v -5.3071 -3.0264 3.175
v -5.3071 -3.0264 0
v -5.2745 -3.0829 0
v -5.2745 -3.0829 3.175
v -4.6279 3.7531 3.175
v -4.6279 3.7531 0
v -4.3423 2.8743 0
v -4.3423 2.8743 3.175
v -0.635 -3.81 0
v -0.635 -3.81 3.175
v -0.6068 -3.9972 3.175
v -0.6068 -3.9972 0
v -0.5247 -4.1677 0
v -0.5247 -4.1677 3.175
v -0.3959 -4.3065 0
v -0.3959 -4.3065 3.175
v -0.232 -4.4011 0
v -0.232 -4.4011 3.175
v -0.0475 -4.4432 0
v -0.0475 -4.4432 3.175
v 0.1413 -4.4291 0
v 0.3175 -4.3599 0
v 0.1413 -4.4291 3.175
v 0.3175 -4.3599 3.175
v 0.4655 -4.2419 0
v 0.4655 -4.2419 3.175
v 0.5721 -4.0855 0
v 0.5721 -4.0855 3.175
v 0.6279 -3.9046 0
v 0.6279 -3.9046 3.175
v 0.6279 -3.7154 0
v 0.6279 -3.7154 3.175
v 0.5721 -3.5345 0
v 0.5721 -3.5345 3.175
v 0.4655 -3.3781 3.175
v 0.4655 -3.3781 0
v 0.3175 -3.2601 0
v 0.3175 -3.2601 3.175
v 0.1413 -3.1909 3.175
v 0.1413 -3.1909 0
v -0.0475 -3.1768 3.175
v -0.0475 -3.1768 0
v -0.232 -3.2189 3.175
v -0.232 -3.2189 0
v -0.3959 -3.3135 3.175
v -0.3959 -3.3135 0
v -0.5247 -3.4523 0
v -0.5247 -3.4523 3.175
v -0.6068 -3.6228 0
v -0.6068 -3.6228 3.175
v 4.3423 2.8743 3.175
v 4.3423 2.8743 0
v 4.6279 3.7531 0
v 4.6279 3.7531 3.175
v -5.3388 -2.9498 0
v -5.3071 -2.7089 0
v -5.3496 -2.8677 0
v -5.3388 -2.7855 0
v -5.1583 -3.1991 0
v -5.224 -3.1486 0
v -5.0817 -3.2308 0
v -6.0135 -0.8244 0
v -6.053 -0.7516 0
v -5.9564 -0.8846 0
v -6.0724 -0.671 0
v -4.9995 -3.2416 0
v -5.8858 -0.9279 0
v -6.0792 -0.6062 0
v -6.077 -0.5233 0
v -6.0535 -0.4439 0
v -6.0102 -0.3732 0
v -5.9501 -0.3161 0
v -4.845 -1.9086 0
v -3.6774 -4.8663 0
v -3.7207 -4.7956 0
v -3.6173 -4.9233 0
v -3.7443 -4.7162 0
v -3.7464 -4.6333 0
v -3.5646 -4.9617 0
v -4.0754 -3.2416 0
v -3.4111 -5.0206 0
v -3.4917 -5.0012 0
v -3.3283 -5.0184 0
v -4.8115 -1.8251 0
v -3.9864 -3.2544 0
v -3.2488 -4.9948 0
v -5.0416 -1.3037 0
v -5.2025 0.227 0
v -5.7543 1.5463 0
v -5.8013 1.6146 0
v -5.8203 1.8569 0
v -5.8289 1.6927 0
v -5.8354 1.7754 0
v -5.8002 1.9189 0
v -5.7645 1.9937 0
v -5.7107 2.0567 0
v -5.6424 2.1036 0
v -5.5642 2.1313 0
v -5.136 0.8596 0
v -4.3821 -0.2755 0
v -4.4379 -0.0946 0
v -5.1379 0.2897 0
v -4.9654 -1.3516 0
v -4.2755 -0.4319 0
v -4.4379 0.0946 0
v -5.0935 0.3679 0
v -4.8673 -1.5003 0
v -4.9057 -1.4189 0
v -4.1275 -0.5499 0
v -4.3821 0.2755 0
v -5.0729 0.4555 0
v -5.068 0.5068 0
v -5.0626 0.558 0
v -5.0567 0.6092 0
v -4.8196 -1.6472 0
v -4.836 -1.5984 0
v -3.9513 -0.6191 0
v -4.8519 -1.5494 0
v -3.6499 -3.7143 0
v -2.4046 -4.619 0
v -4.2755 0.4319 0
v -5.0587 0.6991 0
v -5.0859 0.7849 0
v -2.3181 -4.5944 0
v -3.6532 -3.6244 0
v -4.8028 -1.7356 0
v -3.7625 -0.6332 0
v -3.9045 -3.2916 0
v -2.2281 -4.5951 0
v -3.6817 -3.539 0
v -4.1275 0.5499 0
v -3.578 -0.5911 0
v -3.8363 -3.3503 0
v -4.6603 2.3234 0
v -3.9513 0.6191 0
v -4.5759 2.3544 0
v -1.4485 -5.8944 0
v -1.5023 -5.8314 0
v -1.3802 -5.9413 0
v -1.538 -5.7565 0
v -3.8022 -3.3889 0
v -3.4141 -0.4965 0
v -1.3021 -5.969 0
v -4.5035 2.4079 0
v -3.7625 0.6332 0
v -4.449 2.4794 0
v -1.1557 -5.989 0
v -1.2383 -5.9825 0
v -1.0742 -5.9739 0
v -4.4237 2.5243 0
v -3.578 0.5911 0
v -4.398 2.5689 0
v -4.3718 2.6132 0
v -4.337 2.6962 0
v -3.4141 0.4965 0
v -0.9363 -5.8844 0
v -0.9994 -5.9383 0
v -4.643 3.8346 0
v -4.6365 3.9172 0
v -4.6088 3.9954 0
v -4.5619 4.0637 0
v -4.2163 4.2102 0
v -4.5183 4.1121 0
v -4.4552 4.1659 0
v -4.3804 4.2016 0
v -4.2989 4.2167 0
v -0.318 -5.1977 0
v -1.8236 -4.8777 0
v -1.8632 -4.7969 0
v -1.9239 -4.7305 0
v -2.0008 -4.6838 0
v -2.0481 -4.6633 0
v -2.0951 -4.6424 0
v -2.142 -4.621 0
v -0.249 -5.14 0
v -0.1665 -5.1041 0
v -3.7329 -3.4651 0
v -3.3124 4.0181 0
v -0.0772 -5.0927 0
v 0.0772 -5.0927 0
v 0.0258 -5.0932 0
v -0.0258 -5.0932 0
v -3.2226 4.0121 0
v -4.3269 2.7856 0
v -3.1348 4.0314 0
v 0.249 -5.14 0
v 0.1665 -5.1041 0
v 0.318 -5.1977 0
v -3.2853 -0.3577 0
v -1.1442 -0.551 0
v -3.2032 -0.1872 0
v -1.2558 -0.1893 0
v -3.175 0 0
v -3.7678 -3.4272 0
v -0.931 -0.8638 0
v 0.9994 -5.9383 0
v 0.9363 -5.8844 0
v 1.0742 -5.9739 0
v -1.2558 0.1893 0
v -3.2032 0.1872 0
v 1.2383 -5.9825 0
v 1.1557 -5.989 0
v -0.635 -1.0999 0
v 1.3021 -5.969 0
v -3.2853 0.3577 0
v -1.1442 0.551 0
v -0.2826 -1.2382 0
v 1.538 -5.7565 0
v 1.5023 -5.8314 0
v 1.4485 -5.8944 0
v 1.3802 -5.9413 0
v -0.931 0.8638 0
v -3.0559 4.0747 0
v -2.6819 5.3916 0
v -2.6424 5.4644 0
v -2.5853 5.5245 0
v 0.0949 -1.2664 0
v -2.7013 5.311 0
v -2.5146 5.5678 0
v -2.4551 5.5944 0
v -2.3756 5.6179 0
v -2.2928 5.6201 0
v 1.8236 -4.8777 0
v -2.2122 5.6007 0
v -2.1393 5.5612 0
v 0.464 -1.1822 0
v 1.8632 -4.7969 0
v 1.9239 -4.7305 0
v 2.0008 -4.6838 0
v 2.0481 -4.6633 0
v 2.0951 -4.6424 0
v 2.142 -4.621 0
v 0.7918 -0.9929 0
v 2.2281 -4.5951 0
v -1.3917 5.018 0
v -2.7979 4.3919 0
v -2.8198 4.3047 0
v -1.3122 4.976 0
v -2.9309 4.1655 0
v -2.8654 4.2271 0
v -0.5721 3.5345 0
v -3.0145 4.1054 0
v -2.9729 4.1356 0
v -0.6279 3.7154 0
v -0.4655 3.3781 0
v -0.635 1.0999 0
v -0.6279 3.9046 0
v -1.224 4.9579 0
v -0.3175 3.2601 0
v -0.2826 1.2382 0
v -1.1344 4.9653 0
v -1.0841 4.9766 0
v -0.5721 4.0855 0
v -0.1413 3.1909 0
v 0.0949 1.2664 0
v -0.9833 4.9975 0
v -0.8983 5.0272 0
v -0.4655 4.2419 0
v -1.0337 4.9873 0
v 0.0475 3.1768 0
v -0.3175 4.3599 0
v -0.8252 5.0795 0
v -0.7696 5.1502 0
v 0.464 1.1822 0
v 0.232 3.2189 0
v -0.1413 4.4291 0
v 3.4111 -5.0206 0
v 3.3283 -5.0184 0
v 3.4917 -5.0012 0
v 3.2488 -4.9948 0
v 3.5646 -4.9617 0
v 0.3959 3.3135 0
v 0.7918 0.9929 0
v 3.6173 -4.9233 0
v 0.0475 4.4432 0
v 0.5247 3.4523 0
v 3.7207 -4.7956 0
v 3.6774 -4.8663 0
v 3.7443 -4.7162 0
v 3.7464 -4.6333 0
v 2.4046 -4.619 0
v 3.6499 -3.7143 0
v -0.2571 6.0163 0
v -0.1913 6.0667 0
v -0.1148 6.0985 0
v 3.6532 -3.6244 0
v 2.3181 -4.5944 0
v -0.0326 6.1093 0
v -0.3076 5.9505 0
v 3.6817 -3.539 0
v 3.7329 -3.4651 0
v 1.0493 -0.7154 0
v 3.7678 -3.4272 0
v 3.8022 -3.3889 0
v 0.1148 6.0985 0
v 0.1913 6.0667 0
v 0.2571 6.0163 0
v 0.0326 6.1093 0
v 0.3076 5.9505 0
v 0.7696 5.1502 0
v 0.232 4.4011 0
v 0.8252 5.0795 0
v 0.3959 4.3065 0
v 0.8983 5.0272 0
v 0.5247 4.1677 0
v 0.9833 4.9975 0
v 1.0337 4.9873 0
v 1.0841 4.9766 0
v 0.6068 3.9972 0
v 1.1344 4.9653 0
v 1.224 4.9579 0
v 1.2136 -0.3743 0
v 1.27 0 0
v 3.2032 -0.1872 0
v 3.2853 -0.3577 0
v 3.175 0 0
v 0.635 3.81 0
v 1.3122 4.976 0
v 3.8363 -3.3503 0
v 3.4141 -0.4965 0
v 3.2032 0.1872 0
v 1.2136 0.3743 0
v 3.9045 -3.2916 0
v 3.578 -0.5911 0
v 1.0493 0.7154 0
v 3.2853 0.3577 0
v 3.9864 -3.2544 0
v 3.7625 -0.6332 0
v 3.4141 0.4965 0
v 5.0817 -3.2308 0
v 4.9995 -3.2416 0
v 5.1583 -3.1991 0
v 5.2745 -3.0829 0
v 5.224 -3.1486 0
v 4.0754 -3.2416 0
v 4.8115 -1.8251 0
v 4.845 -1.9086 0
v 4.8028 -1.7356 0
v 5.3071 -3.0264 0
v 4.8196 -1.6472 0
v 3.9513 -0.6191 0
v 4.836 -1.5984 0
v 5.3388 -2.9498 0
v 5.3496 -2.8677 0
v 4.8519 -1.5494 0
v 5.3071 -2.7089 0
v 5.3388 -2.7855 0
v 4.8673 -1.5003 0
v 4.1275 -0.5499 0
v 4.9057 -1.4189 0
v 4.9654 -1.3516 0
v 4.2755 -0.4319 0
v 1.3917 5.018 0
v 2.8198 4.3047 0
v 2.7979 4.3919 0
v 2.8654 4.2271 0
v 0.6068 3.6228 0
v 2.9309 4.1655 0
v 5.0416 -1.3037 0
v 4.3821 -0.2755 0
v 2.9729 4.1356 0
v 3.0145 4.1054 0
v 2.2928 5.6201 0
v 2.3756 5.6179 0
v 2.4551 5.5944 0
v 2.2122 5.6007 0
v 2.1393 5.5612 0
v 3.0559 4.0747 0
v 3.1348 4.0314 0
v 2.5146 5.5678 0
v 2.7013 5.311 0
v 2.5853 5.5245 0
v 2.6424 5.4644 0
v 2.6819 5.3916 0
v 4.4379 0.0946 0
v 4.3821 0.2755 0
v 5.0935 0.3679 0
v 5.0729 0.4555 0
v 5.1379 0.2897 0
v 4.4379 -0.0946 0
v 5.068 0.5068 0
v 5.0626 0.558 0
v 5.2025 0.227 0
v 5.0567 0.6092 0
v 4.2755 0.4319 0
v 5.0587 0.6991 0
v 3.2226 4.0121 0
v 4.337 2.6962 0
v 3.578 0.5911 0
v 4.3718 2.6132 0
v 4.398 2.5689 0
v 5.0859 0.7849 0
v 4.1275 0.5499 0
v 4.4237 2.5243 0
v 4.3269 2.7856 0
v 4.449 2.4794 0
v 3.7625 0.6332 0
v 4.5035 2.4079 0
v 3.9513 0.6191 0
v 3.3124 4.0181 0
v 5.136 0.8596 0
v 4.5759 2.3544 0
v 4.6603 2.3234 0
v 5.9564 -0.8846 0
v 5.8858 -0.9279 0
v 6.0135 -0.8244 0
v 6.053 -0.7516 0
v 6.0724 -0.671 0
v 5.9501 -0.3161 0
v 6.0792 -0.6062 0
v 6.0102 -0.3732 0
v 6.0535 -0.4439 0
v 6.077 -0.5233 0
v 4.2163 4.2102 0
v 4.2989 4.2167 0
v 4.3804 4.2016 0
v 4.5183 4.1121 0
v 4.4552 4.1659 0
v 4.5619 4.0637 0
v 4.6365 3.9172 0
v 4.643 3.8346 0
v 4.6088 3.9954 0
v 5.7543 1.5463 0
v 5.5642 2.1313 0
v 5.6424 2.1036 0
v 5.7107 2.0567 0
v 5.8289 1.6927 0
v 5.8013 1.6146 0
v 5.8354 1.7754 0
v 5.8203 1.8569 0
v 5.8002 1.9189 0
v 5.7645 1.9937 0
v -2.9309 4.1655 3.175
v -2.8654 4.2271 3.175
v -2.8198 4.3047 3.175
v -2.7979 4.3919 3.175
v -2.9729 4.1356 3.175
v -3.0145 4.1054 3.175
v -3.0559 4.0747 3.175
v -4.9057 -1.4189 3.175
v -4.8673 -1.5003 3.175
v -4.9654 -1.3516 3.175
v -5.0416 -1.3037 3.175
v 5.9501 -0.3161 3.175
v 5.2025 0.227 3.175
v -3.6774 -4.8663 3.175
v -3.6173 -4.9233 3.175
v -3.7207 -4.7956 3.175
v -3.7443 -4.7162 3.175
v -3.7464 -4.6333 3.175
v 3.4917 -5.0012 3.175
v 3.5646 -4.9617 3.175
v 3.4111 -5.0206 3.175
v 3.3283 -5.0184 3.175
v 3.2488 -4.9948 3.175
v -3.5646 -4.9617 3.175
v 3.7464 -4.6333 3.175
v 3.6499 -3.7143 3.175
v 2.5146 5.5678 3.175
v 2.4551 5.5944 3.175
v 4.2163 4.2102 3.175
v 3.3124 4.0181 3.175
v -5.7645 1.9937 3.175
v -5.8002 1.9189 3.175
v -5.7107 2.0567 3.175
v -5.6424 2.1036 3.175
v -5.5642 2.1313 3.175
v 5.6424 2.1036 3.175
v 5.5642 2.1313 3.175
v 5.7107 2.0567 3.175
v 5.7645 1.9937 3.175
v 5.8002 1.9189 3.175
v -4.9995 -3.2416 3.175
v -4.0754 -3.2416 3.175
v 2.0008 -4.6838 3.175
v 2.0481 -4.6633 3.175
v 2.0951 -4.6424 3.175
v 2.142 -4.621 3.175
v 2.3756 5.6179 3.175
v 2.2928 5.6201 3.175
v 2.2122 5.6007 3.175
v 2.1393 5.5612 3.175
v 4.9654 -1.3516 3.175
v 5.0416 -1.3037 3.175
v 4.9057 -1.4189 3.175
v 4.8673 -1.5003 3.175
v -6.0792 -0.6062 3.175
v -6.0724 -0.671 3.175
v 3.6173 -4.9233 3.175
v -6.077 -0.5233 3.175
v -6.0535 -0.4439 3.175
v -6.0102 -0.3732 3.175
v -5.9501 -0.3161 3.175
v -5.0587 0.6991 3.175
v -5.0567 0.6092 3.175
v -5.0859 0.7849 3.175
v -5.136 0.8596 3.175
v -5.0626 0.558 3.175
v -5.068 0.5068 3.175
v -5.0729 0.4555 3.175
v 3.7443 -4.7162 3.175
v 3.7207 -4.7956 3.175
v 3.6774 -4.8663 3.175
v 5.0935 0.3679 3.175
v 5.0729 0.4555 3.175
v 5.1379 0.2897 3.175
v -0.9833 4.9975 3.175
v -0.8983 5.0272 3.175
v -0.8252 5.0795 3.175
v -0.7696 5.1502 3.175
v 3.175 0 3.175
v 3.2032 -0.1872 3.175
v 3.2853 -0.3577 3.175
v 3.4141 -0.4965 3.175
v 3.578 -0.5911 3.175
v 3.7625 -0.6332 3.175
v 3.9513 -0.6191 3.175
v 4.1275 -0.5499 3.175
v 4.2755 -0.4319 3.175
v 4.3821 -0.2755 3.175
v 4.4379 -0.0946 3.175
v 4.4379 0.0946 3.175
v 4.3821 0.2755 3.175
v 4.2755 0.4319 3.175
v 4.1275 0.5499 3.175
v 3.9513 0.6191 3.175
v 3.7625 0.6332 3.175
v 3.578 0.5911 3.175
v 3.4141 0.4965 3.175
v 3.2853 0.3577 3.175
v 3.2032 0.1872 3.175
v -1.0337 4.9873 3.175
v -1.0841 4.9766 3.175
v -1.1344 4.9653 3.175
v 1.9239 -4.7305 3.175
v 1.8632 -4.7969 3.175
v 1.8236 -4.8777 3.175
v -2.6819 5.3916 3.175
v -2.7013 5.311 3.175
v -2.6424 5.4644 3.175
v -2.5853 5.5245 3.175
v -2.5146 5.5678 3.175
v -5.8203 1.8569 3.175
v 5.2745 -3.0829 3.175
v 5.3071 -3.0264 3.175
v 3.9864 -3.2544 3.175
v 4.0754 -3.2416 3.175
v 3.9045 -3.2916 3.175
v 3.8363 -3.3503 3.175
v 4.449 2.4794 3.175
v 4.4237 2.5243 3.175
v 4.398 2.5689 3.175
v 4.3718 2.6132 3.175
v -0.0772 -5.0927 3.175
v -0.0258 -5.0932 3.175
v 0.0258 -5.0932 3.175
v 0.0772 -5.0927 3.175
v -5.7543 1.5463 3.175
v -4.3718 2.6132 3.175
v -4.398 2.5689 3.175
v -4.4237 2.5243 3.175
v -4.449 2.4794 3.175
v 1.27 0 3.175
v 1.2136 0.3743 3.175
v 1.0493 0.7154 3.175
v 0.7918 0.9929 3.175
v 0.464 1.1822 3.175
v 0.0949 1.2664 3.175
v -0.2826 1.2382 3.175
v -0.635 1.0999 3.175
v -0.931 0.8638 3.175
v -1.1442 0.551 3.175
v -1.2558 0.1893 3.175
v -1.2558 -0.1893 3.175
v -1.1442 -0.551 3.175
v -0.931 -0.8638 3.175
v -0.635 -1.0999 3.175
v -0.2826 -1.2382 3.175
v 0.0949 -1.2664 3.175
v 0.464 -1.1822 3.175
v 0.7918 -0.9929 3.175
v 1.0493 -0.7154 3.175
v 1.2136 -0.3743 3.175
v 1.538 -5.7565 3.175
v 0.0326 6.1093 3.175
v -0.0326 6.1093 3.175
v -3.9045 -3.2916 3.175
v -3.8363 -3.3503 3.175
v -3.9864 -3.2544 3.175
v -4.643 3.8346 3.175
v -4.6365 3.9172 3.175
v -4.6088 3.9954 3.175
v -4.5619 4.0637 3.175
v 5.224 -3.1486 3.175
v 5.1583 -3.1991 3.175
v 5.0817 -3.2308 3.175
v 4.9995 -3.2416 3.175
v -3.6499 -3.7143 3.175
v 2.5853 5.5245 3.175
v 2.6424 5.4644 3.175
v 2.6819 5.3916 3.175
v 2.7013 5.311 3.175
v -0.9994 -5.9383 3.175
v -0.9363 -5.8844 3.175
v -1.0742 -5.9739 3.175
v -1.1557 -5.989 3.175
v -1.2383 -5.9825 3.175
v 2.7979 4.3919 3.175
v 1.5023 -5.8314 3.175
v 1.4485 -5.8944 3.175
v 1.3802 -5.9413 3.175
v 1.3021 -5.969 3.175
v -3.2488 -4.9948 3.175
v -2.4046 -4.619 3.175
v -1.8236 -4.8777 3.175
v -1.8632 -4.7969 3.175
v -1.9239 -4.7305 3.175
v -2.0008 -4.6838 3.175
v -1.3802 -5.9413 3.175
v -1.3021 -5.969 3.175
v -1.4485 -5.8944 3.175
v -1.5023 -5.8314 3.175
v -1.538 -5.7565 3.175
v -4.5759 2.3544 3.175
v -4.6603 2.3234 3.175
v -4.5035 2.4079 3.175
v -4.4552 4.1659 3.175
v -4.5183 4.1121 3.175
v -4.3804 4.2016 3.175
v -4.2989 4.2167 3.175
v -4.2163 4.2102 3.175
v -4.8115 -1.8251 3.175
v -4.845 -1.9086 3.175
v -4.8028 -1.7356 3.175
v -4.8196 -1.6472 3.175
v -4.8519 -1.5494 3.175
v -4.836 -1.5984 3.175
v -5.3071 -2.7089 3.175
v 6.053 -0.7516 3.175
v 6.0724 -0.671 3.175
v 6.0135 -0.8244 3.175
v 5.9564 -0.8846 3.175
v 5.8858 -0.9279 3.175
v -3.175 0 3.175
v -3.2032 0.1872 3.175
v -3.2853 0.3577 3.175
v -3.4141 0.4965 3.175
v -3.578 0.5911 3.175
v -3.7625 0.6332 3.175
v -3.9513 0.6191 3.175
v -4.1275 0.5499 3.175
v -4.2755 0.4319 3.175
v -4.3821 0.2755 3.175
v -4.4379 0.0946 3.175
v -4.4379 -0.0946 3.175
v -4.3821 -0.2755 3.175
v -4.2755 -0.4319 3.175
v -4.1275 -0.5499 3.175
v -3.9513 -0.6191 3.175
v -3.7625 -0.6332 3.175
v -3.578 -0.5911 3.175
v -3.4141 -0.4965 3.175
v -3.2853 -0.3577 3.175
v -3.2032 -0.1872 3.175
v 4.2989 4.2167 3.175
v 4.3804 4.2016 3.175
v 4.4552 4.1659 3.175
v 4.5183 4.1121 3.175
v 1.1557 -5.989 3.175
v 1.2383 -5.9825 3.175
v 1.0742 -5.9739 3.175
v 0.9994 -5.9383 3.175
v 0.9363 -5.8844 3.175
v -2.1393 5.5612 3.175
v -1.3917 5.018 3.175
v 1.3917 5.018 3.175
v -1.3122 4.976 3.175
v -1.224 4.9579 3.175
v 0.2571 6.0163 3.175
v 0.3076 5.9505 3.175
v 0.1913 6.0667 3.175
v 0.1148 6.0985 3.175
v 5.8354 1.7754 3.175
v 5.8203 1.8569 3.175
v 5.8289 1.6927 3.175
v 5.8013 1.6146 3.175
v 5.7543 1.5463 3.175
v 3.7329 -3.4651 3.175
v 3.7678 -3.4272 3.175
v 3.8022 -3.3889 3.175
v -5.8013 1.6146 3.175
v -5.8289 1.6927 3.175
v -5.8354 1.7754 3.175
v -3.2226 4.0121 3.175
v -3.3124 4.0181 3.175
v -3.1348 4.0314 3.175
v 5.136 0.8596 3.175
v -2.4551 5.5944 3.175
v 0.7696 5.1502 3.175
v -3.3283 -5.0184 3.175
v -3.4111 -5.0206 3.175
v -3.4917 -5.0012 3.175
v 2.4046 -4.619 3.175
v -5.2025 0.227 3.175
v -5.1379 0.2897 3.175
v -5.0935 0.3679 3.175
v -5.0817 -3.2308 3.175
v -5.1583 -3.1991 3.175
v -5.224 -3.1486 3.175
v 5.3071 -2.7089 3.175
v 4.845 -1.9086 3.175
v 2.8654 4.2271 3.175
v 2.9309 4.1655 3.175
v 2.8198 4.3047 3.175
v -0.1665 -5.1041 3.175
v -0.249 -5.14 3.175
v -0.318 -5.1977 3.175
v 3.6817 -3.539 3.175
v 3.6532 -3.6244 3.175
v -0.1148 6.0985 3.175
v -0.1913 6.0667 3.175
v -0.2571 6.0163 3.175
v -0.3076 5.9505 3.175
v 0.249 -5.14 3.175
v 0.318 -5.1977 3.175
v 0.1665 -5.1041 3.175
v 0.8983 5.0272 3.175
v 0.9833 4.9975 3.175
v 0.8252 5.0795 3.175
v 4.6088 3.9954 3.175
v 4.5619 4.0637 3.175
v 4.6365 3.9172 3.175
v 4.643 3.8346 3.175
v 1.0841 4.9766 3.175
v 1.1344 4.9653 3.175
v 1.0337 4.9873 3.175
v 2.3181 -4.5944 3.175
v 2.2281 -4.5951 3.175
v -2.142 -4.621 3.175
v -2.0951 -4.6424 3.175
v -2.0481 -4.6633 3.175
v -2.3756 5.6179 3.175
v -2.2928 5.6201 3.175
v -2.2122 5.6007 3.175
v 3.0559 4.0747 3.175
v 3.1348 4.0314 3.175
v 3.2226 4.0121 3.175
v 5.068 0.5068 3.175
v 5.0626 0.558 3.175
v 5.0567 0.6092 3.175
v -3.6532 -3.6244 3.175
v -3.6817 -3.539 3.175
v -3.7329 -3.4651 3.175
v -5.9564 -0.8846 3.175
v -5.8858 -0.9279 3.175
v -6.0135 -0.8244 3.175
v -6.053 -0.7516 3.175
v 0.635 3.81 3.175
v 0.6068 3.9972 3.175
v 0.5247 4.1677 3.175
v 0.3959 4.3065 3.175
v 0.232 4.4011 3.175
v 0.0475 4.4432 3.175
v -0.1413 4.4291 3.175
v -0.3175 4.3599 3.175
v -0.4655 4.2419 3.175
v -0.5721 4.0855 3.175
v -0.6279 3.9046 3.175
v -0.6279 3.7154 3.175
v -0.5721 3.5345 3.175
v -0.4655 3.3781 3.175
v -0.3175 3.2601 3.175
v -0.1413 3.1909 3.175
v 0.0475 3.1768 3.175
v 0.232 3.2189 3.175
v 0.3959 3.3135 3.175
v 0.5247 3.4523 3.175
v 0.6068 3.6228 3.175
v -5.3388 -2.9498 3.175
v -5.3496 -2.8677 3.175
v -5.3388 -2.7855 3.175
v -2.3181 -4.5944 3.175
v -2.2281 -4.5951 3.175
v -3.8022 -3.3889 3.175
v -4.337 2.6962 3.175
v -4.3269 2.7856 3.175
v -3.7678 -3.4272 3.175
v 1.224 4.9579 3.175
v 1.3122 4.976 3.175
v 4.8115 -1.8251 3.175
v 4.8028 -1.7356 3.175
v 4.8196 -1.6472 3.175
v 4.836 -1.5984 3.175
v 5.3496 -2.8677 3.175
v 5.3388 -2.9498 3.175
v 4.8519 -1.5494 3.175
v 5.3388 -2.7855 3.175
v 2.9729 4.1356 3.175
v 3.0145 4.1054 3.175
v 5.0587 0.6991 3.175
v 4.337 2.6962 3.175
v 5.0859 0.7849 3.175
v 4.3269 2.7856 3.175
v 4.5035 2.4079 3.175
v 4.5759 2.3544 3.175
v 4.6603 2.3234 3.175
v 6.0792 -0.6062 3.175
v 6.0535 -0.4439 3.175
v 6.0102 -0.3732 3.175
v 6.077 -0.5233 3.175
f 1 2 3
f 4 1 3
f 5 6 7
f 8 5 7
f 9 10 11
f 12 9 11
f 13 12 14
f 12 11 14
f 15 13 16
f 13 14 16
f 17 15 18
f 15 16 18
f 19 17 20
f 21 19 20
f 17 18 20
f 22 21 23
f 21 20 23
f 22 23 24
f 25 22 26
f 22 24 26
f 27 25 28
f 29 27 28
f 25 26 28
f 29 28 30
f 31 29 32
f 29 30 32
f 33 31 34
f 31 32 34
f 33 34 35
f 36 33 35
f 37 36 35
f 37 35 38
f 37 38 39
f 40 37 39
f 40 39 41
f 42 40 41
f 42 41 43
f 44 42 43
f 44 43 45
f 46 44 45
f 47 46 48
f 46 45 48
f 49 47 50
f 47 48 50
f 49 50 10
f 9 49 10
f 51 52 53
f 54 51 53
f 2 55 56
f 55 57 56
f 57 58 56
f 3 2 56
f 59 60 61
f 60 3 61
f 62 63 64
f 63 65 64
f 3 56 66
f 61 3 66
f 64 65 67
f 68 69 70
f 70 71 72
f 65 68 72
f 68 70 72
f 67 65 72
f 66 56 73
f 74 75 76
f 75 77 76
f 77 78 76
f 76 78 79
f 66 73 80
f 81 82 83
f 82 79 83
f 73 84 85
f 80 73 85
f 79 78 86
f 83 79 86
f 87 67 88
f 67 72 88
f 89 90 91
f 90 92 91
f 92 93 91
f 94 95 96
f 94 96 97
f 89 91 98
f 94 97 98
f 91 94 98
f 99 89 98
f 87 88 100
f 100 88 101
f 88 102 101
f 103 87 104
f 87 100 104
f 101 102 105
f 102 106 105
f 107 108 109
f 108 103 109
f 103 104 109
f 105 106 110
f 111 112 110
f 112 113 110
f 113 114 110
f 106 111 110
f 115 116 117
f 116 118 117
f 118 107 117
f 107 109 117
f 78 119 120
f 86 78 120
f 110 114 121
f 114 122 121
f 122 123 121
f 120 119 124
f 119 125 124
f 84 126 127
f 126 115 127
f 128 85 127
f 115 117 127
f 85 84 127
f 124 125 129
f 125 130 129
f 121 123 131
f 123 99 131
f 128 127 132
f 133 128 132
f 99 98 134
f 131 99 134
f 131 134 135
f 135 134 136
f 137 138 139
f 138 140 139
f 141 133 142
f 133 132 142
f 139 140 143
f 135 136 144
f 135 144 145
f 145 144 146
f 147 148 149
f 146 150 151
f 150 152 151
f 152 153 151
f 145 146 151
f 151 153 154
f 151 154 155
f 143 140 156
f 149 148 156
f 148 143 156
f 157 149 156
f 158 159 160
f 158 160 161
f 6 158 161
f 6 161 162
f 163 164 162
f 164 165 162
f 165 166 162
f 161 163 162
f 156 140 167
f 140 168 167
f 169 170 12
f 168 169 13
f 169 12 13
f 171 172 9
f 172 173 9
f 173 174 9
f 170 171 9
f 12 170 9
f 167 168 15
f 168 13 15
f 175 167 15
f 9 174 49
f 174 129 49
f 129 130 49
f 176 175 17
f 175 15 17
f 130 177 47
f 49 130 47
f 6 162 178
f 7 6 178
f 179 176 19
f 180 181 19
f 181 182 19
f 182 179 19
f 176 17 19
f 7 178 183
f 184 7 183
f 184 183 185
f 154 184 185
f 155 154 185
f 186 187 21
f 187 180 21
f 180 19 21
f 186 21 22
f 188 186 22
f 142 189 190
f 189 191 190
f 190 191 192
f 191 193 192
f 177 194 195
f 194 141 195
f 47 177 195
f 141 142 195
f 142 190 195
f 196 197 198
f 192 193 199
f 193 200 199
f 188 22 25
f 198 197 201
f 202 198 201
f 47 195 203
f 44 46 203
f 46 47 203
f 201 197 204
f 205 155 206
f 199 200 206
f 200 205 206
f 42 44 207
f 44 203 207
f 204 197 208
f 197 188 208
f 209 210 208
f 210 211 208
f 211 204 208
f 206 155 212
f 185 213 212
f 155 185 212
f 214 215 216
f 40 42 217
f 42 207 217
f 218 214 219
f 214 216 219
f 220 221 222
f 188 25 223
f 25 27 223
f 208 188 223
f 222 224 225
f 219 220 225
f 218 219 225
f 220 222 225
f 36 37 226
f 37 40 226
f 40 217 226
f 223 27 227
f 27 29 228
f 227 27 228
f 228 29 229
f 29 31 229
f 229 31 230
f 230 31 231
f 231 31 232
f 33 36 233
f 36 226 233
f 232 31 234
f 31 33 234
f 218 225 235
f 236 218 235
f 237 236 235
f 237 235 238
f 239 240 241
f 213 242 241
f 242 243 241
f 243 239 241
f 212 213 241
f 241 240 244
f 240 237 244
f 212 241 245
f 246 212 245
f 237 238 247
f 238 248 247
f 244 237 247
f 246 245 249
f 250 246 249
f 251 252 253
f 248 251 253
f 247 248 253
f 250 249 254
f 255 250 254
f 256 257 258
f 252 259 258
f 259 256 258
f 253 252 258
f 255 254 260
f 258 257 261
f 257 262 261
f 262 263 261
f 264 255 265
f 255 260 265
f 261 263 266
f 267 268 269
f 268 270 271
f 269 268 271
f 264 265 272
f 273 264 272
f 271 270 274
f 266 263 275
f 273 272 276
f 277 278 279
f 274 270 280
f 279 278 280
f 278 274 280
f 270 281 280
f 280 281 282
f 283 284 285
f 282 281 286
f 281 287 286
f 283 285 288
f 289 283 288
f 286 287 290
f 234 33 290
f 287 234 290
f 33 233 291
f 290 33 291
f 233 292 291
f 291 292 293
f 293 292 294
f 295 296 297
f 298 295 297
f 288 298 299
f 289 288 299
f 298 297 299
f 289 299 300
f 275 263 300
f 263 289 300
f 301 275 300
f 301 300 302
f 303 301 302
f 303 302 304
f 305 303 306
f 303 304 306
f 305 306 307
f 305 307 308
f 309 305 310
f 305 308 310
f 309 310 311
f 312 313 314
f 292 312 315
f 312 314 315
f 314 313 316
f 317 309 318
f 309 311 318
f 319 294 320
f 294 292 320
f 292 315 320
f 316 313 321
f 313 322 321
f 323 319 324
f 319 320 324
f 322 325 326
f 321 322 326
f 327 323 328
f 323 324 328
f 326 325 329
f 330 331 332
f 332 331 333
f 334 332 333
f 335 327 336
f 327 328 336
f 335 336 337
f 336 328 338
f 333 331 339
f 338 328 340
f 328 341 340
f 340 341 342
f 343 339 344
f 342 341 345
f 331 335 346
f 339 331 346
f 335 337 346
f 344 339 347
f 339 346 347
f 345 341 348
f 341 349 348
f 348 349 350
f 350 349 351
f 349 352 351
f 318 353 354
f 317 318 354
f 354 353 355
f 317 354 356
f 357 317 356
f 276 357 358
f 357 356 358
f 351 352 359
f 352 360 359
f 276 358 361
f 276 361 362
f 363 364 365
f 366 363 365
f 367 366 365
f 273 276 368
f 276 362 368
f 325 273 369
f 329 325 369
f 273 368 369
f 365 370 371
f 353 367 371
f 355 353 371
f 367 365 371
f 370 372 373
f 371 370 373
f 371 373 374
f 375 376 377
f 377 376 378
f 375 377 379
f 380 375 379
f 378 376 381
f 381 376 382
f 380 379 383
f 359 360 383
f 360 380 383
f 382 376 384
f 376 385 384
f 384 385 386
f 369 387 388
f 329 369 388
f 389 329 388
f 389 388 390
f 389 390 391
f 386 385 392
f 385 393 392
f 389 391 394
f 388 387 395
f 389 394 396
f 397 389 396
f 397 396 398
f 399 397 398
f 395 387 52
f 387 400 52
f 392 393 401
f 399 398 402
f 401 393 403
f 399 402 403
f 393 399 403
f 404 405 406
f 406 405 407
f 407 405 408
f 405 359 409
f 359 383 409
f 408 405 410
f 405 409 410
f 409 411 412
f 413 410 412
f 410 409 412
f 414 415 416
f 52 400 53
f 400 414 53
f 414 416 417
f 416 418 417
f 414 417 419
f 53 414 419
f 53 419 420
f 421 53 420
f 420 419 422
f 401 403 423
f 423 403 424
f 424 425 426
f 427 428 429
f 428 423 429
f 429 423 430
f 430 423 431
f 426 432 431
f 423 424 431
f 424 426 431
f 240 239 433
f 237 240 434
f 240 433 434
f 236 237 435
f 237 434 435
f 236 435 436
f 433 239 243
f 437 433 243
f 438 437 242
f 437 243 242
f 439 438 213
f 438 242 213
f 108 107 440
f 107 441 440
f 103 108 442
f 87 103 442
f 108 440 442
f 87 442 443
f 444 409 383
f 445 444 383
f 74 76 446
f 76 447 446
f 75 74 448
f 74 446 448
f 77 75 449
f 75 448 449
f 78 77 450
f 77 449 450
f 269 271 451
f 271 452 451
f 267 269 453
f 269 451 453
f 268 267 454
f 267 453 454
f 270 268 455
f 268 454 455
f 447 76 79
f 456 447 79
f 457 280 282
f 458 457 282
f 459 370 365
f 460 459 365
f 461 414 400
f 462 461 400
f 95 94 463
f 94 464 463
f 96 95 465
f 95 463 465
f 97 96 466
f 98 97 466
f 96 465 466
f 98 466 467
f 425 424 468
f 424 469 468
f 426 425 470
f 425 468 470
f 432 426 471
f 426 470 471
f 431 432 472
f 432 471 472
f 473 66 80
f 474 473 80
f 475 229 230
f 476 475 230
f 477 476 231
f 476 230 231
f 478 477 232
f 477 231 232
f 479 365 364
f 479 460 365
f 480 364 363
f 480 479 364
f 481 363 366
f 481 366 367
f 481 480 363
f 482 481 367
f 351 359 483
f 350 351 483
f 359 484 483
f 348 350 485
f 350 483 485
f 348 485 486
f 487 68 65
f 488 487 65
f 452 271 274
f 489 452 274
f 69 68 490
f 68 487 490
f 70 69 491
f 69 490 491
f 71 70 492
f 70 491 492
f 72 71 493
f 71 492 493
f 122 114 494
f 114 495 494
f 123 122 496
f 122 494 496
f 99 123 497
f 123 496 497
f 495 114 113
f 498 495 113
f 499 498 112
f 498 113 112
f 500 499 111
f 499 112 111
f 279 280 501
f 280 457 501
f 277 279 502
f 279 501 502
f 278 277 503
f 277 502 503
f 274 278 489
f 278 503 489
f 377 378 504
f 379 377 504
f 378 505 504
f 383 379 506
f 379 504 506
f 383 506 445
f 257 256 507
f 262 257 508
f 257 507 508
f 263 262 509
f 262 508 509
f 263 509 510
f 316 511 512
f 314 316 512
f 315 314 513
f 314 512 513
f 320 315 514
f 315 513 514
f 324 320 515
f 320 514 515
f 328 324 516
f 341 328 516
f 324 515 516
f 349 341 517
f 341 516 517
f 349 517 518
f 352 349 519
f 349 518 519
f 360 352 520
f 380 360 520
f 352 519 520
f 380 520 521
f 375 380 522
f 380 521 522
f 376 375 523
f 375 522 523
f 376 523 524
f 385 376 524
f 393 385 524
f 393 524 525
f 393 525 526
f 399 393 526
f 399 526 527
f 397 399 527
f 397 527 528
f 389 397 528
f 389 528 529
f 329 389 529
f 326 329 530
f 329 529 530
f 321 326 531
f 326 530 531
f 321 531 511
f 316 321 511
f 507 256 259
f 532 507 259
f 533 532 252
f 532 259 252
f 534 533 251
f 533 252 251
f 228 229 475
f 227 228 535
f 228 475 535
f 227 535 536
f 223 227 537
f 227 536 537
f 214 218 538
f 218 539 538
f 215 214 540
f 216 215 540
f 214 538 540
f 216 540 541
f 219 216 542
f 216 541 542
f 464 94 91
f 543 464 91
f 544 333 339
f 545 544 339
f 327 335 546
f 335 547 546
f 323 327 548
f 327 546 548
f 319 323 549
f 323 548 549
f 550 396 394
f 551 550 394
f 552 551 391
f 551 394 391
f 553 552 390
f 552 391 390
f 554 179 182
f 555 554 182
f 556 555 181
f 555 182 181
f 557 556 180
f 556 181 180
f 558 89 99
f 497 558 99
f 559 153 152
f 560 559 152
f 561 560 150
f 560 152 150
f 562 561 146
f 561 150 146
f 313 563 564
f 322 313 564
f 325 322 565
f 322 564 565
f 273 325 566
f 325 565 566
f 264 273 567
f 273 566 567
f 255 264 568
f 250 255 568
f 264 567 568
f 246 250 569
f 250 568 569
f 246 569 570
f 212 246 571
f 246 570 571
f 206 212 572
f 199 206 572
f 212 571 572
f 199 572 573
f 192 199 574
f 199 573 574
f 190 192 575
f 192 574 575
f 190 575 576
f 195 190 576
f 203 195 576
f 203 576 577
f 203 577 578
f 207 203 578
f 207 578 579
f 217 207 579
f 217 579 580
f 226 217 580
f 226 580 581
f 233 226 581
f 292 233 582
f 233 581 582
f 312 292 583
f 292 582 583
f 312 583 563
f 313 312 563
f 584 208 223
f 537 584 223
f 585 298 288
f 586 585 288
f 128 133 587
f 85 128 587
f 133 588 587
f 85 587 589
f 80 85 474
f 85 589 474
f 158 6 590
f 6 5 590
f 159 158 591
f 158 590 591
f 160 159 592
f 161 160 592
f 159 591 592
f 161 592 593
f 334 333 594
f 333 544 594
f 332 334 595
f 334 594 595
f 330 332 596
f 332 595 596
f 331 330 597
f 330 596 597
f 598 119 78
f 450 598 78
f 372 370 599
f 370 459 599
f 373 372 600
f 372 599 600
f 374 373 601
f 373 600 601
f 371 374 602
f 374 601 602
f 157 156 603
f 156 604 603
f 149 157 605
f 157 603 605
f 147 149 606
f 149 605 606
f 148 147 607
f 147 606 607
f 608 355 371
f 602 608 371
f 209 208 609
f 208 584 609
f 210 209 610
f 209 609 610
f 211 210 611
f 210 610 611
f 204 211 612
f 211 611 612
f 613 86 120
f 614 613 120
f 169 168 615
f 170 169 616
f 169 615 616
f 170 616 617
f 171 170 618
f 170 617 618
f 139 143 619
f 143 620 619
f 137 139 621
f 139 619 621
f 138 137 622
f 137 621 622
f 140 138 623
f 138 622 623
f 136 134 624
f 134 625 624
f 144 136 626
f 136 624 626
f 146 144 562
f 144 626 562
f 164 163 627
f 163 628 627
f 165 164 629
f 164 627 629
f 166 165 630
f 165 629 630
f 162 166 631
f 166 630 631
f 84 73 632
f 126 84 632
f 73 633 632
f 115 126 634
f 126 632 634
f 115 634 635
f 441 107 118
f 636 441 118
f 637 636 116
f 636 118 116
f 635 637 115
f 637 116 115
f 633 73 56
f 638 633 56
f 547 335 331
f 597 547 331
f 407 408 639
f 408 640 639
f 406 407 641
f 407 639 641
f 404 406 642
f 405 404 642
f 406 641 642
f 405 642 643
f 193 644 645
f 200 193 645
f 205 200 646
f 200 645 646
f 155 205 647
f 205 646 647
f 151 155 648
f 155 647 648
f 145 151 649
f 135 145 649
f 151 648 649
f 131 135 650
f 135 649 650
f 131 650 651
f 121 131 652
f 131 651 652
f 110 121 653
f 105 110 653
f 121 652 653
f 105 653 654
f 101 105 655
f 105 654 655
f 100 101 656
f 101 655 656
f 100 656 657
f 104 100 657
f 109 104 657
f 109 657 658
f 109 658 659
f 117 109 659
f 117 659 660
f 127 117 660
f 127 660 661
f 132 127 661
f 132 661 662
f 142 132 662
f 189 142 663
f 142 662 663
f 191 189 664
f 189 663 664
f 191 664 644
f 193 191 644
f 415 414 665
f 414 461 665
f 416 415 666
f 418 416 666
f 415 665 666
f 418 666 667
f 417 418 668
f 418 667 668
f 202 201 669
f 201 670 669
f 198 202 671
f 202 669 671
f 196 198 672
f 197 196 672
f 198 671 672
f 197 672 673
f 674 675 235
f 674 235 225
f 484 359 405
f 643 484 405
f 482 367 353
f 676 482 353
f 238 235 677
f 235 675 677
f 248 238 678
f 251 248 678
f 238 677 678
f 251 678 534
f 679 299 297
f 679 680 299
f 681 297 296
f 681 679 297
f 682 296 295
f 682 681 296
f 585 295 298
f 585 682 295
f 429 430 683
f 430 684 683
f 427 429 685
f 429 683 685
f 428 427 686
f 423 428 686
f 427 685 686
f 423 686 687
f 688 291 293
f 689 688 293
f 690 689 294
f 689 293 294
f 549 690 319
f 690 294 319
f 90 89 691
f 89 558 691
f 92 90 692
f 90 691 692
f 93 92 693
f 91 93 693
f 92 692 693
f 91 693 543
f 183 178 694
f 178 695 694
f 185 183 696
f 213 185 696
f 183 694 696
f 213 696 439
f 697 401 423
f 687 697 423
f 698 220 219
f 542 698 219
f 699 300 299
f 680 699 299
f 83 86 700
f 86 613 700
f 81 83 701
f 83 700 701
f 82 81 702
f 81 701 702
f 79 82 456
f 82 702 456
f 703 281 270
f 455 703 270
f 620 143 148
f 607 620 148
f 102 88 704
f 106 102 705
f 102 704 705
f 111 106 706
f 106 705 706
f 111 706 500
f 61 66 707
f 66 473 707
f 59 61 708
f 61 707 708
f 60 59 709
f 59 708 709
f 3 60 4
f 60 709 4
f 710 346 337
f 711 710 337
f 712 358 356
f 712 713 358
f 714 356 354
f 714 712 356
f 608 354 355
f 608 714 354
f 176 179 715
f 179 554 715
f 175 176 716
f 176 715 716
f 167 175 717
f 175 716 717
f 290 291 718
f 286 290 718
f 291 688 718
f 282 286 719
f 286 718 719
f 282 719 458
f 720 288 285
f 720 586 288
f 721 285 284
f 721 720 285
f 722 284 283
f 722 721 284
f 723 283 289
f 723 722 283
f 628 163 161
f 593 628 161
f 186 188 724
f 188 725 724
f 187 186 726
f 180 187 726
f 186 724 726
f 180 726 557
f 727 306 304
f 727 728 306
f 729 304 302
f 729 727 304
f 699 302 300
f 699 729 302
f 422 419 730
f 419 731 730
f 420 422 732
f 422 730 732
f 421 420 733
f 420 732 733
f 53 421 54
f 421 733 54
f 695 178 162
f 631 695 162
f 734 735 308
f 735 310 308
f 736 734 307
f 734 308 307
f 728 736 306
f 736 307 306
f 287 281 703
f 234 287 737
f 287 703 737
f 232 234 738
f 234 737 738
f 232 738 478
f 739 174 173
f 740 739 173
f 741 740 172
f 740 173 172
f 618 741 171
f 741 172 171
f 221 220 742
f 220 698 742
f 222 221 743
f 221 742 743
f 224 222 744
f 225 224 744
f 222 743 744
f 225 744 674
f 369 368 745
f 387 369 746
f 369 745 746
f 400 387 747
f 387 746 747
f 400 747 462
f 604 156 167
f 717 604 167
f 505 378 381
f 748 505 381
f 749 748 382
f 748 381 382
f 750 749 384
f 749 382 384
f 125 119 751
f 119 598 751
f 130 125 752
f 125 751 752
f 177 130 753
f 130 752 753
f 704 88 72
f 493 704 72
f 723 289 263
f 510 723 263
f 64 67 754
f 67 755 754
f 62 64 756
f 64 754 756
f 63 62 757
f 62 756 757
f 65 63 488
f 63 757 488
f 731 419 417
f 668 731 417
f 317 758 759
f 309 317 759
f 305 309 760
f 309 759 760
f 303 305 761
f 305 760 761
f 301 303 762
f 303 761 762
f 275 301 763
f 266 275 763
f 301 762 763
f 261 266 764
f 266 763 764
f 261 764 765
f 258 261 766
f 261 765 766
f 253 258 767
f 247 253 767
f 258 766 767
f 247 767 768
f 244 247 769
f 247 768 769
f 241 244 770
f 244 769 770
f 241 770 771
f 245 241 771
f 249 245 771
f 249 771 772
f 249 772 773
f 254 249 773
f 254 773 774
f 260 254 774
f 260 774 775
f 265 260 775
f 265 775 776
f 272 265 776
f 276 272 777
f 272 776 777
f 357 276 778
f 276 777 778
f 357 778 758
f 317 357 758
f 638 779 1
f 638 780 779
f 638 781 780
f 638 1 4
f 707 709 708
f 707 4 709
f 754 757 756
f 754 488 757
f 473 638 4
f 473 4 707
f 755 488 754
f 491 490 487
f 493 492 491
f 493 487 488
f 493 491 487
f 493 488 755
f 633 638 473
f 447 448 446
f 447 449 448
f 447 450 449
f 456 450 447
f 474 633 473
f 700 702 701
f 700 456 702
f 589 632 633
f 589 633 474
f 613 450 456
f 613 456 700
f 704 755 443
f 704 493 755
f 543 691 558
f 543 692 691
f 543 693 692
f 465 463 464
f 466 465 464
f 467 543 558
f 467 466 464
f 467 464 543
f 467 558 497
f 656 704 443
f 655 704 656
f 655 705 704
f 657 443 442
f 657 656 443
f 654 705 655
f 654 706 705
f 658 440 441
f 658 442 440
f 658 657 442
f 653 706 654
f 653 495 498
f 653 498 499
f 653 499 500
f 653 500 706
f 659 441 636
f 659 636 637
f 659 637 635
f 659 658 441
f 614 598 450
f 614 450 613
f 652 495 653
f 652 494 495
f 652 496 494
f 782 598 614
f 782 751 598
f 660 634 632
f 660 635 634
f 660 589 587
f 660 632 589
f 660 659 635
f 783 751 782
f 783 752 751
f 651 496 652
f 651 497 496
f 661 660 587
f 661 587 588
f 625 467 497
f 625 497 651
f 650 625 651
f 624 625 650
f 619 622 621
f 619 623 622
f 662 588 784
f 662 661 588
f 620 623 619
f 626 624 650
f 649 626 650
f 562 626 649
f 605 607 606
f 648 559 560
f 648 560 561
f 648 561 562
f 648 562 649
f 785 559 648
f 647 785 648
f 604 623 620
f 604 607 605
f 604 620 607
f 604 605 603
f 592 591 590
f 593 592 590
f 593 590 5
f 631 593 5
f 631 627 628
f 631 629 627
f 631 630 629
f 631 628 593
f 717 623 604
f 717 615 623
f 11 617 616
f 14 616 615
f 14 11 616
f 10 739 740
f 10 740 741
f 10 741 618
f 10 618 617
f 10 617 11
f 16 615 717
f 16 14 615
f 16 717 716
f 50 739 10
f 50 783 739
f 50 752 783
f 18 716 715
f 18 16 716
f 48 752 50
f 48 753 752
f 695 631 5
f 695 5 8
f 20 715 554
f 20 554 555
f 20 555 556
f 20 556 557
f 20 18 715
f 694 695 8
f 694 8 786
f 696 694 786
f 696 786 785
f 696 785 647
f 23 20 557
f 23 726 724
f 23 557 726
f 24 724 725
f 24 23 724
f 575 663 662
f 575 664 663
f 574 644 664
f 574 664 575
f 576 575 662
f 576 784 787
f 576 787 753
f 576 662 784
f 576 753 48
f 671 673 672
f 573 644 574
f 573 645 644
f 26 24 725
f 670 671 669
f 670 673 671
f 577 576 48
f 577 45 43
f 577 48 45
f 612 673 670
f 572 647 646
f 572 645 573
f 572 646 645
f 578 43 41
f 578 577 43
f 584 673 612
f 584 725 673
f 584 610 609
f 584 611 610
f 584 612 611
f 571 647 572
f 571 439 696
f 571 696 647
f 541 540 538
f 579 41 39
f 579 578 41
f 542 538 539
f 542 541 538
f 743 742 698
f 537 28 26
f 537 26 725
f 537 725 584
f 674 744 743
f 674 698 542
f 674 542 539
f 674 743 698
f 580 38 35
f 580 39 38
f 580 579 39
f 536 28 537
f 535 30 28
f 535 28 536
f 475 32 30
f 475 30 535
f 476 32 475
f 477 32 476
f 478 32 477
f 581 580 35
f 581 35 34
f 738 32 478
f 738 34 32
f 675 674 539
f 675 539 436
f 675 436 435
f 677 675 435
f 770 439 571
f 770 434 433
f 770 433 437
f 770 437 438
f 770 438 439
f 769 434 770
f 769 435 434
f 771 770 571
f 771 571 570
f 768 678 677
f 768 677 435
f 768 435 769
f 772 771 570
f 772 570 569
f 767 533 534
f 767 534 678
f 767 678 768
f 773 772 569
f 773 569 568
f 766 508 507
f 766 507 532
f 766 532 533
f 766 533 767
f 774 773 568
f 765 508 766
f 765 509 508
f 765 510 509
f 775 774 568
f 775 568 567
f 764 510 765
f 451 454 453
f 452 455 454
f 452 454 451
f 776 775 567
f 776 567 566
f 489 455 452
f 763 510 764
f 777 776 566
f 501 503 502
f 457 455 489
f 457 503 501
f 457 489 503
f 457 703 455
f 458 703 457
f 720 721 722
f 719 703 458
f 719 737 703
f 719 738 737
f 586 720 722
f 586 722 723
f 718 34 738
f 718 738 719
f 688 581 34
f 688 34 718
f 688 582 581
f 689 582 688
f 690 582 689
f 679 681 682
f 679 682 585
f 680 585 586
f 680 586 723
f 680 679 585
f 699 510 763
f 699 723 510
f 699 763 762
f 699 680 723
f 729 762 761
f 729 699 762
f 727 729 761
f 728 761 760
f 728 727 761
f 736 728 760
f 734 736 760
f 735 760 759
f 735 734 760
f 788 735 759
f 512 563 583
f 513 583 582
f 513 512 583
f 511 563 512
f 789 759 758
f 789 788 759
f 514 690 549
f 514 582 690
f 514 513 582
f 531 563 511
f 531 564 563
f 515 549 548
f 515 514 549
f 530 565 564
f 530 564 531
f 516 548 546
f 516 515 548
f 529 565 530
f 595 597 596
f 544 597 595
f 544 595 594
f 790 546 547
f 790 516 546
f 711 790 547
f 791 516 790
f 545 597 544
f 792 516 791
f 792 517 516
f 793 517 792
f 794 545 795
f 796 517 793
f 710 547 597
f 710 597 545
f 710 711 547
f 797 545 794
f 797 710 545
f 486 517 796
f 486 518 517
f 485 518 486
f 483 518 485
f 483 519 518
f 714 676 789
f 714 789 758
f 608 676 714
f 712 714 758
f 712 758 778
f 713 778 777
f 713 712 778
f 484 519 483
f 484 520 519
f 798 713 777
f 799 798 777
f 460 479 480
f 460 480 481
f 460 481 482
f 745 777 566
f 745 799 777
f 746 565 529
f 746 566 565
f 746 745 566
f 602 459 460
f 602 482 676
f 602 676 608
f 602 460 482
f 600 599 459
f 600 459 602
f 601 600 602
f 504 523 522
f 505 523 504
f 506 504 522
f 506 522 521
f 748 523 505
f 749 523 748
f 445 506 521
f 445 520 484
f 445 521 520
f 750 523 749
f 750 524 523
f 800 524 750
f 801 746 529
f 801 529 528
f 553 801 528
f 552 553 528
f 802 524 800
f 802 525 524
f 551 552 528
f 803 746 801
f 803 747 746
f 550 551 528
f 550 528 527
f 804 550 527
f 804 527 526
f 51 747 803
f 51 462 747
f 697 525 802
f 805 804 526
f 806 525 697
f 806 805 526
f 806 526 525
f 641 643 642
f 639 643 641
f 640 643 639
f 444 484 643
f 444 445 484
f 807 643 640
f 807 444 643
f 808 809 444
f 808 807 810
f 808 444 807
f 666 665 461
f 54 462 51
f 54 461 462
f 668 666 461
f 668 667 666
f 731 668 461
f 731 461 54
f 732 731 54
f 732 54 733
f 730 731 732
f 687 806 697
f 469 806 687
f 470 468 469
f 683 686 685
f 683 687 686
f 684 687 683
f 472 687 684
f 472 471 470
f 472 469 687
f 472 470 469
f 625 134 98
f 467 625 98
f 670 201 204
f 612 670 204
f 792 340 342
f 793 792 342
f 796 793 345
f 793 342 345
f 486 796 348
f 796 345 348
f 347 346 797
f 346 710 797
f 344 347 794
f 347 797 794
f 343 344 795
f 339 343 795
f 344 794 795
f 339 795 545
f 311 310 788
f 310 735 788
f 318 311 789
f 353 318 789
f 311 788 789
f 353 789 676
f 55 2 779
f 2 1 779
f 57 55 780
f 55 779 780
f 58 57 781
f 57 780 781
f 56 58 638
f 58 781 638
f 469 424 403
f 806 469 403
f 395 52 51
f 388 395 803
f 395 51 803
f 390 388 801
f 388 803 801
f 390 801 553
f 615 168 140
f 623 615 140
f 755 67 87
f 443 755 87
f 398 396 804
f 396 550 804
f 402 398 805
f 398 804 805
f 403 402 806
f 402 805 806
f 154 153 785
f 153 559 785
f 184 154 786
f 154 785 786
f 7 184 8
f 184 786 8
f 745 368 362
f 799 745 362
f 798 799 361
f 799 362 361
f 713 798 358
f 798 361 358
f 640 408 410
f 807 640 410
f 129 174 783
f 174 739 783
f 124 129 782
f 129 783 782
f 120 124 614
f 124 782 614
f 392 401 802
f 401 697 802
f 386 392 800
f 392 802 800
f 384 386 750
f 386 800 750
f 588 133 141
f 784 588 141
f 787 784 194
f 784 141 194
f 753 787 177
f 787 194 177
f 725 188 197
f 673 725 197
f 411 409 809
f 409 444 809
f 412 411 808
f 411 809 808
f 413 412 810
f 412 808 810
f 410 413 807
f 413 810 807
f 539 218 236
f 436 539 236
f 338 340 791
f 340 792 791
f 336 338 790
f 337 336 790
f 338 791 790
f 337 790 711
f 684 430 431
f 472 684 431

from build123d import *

# Parameters (mm, degrees)
BOSS_EXTRUDE1_DEPTH      = 3.175
SKETCH6_R                = 5.093270322110958
BOSS_EXTRUDE2_DEPTH      = 3.175
FILLET1_R                = 0.3175
CIRPATTERN3_COUNT        = 15
FILLET1_OF_CIRPATTERN3_R = 0.3175
SKETCH7_R                = 1.27
SKETCH7_R_2              = 0.635
SKETCH7_R_3              = 0.6350000000000001
CUT_EXTRUDE1_DEPTH       = 3.175


with BuildPart() as part:
    # Sketch1 → Boss-Extrude1 (new body)
    with BuildSketch(Plane.XY):
        with BuildLine():
            Line((0.21589999999999998, 6.109270322110954), (-0.21589999999999998, 6.109270322110954))
            Line((-0.21589999999999998, 6.109270322110954), (-0.8430504444620047, 5.023013888313339))
            ThreePointArc((-0.8430504444620047, 5.023013888313339), (-0.9512218419347573, 5.003656621064491), (-1.0589504444620048, 4.981970145461529))
            ThreePointArc((-1.0589504444620048, 4.981970145461529), (-1.7e-16, 4.028486882556943), (1.0589504444620048, 4.981970145461529))
            ThreePointArc((1.0589504444620048, 4.981970145461529), (0.9512218419347568, 5.003656621064491), (0.8430504444620047, 5.023013888313339))
            Line((0.8430504444620047, 5.023013888313339), (0.21589999999999998, 6.109270322110954))
        make_face()
    boss_extrude1 = extrude(amount=BOSS_EXTRUDE1_DEPTH)

    # Sketch6 → Boss-Extrude2 (add)
    with BuildSketch(Plane.XY):
        Circle(SKETCH6_R)
    extrude(amount=BOSS_EXTRUDE2_DEPTH)

    # Fillet1
    fillet1_edges = [part.edges().sort_by_distance(p)[0] for p in [
        (-0.8430504444620048, 5.02301388831334, 1.5875),
        (-0.21589999999999998, 6.109270322110954, 1.5875),
        (0.21589999999999998, 6.109270322110954, 1.5875),
        (0.8430504444620048, 5.02301388831334, 1.5875),
    ]]
    fillet(fillet1_edges, radius=FILLET1_R)

    # CirPattern3: Boss-Extrude1 ×15 about axis
    cirpattern3_axis = Axis((0, -7e-17, 0), (0, 0, 1))
    for i in range(1, CIRPATTERN3_COUNT):
        add(boss_extrude1.rotate(cirpattern3_axis, i * 360 / CIRPATTERN3_COUNT))

    # Fillet1 of CirPattern3
    fillet1_of_cirpattern3_edges = [part.edges().sort_by_distance(p)[0] for p in [
        (-2.8132087111575306, 4.245852013620313, 1.5875),
        (-2.6820985667630595, 5.493281711035146, 1.5875),
        (-2.2876296381529846, 5.668910593515277, 1.5875),
        (-1.2728789029538499, 4.931651029068387, 1.5875),
        (-4.2969376344951105, 2.734543753417715, 1.5875),
        (-4.684537925232247, 3.92745478722371, 1.5875),
        (-4.3956073294064915, 4.248344722864849, 1.5875),
        (-3.168715924307178, 3.9875609042544276, 1.5875),
        (-5.037687004375571, 0.7504080356990912, 1.5875),
        (-5.876978118737766, 1.6825352508946705, 1.5875),
        (-5.743544580566663, 2.093201454630918, 1.5875),
        (-4.516653175467346, 2.353985273241322, 1.5875),
        (-4.907374525249817, -1.3634800486348928, 1.5875),
        (-6.053235404843441, -0.8533099156669512, 1.5875),
        (-6.098370795282413, -0.42387536124693076, 1.5875),
        (-5.083620060083269, 0.3133842031999436, 1.5875),
        (-3.928532408610401, -3.2416100457325268, 1.5875),
        (-5.182833297534428, -3.241610045732536, 1.5875),
        (-5.398733297534427, -2.8676602763784156, 1.5875),
        (-4.771582853072406, -1.7814038425808105, 1.5875),
        (-2.270411348925739, -4.559236216820256, 1.5875),
        (-3.4162722285193556, -5.069406349788216, 1.5875),
        (-3.7656057666904577, -4.815600677848326, 1.5875),
        (-3.634495622295968, -3.5681709804334942, 1.5875),
        (-0.21971554097223567, -5.088529026659036, 1.5875),
        (-1.059006655334417, -6.0206562418546286, 1.5875),
        (-1.4813707893312742, -5.930879973759519, 1.5875),
        (-1.8689710800683925, -4.737968939953519, 1.5875),
        (1.8689710800683934, -4.737968939953517, 1.5875),
        (1.4813707893312753, -5.930879973759519, 1.5875),
        (1.0590066553344182, -6.0206562418546286, 1.5875),
        (0.21971554097223658, -5.088529026659036, 1.5875),
        (3.6344956222959675, -3.5681709804334965, 1.5874999999999997),
        (3.7656057666904563, -4.815600677848327, 1.5874999999999997),
        (3.4162722285193543, -5.069406349788217, 1.5874999999999997),
        (2.270411348925738, -4.559236216820258, 1.5874999999999997),
        (4.771582853072404, -1.781403842580814, 1.5875),
        (5.398733297534425, -2.8676602763784196, 1.5875),
        (5.182833297534425, -3.24161004573254, 1.5875),
        (3.928532408610399, -3.2416100457325303, 1.5875),
        (5.083620060083269, 0.3133842031999447, 1.5875),
        (6.098370795282414, -0.42387536124692954, 1.5875),
        (6.053235404843442, -0.85330991566695, 1.5875),
        (4.907374525249819, -1.363480048634892, 1.5875),
        (4.516653175467346, 2.3539852732413205, 1.5875),
        (5.743544580566664, 2.0932014546309166, 1.5875),
        (5.8769781187377665, 1.6825352508946692, 1.5875),
        (5.037687004375571, 0.7504080356990901, 1.5875),
        (3.1687159243071803, 3.9875609042544253, 1.5875),
        (4.395607329406493, 4.2483447228648465, 1.5875),
        (4.684537925232249, 3.9274547872237076, 1.5875),
        (4.296937634495112, 2.7345437534177126, 1.5875),
        (1.2728789029538499, 4.931651029068388, 1.5875),
        (2.2876296381529846, 5.668910593515278, 1.5875),
        (2.6820985667630595, 5.493281711035147, 1.5875),
        (2.8132087111575306, 4.245852013620314, 1.5875),
    ]]
    fillet(fillet1_of_cirpattern3_edges, radius=FILLET1_OF_CIRPATTERN3_R)

    # Sketch7 → Cut-Extrude1 (cut)
    with BuildSketch(Plane.XY.offset(3.175)):
        Circle(SKETCH7_R)
        with Locations((0, 3.8099999999999996)):
            Circle(SKETCH7_R_2)
        with Locations((-3.8099999999999996, 0)):
            Circle(SKETCH7_R_3)
        with Locations(Location((3.8099999999999996, 0, 0), (0, 0, 180))):
            Circle(SKETCH7_R_3)
        with Locations(Location((-1.73e-15, -3.8099999999999996, 0), (0, 0, 180))):
            Circle(SKETCH7_R_2)
    extrude(amount=-CUT_EXTRUDE1_DEPTH, mode=Mode.SUBTRACT)


solid = part.part
